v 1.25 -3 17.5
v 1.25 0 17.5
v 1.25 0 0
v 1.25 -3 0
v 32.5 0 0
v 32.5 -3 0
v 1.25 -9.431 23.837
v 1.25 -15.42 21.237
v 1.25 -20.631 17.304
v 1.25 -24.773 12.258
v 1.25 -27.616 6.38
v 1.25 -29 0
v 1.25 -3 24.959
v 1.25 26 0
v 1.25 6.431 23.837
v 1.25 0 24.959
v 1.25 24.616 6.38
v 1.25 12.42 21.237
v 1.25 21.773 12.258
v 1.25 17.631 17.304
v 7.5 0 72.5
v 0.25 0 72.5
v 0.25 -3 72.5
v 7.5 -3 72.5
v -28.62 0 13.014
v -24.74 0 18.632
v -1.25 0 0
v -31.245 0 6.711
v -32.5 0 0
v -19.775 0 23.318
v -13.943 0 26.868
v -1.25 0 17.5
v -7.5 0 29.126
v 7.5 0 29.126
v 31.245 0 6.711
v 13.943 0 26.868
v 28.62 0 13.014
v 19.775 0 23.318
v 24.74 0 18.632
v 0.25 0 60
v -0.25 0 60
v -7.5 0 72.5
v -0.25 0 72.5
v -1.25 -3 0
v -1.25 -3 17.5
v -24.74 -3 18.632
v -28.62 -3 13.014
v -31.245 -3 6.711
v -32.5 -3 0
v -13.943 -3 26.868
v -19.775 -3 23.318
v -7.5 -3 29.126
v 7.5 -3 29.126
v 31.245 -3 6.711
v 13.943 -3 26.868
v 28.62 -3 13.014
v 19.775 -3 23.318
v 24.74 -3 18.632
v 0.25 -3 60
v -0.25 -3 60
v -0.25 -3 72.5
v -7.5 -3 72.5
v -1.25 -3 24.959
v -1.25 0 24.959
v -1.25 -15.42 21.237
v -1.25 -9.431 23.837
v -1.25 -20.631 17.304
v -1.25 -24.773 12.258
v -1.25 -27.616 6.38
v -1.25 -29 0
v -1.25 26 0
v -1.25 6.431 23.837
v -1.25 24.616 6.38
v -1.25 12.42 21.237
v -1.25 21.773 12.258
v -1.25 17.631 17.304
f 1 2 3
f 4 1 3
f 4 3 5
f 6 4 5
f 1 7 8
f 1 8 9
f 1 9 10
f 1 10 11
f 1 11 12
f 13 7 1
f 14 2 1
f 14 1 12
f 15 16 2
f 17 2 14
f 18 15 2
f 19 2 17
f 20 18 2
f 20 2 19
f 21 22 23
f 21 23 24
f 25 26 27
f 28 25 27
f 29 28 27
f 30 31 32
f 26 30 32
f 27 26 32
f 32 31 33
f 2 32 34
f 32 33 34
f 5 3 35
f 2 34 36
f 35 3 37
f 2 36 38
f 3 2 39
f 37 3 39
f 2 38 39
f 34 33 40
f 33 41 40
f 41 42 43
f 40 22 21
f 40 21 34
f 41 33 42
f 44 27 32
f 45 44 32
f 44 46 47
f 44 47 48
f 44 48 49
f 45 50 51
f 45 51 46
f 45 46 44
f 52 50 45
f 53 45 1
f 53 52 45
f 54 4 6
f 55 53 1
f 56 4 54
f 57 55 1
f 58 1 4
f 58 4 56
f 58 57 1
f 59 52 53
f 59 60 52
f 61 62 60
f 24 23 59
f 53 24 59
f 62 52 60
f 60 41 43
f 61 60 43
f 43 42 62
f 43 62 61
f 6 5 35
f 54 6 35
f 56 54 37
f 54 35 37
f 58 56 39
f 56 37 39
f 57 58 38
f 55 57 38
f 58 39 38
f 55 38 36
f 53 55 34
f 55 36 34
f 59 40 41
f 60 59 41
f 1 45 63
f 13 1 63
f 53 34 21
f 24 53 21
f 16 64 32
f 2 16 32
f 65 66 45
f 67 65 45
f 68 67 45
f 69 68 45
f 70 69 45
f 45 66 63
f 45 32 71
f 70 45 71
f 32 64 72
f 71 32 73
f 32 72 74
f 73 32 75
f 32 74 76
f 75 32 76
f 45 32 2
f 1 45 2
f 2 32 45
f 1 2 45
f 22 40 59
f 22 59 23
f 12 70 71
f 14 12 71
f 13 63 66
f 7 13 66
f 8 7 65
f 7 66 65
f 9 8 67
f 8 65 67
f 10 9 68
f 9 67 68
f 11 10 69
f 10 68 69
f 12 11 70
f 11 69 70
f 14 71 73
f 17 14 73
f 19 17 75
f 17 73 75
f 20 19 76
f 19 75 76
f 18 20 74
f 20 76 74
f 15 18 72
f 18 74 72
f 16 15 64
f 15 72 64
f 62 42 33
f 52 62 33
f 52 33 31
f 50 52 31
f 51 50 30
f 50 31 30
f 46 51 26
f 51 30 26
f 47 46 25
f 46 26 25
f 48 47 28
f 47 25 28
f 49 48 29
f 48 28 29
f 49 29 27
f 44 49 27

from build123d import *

# Parameters (mm, degrees)
F0_W     = 7.25
F0_H     = 12.5
F1_DEPTH = 3
F3_DEPTH = 2.5


with BuildPart() as f1:
    # F0 (on Front) → F1 (new body)
    with BuildSketch(Plane.XZ):
        with BuildLine():
            ThreePointArc((-7.5, 29.125656592), (-24.7401691178, 18.6315512644), (-32.5, 0))
            Line((-32.5, 0), (-7.5, 0))
            Line((-7.5, 0), (-7.5, 29.125656592))
        make_face()
        with BuildLine():
            Line((-7.5, 29.125656592), (-7.5, 0))
            Line((-7.5, 0), (-1.25, 0))
            Line((-1.25, 0), (-1.25, 17.5))
            Line((-1.25, 17.5), (0, 17.5))
            Line((0, 17.5), (0, 30))
            ThreePointArc((0, 30), (-3.7753965485, 29.7806764691), (-7.5, 29.125656592))
        make_face()
        with BuildLine():
            Line((-7.5, 60), (-7.5, 29.125656592))
            ThreePointArc((-7.5, 29.125656592), (-3.7753965485, 29.7806764691), (0, 30))
            ThreePointArc((0, 30), (3.7753965485, 29.7806764691), (7.5, 29.125656592))
            Line((7.5, 29.125656592), (7.5, 60))
            Line((7.5, 60), (0.25, 60))
            Line((0.25, 60), (-0.25, 60))
            Line((-0.25, 60), (-7.5, 60))
        make_face()
        with BuildLine():
            ThreePointArc((7.5, 29.125656592), (3.7753965485, 29.7806764691), (0, 30))
            Line((0, 30), (0, 17.5))
            Line((0, 17.5), (1.25, 17.5))
            Line((1.25, 17.5), (1.25, 0))
            Line((1.25, 0), (7.5, 0))
            Line((7.5, 0), (7.5, 29.125656592))
        make_face()
        with Locations((-3.875, 66.25)):
            Rectangle(F0_W, F0_H)
        with BuildLine():
            ThreePointArc((32.5, 0), (24.7401691178, 18.6315512644), (7.5, 29.125656592))
            Line((7.5, 29.125656592), (7.5, 0))
            Line((7.5, 0), (32.5, 0))
        make_face()
        with Locations((3.875, 66.25)):
            Rectangle(F0_W, F0_H)
    extrude(amount=F1_DEPTH)


with BuildPart() as f3:
    # F2 (on face) → F3 (new body)
    with BuildSketch(Plane.YZ.offset(-1.25)):
        Polygon((-3, 17.5), (-3, 0), (-1.5, 0), (0, 0), (0, 17.5), align=None)
        with BuildLine():
            Line((-29, 0), (-3, 0))
            Line((-3, 0), (-3, 17.5))
            Line((-3, 17.5), (-3, 24.9592459567))
            ThreePointArc((-3, 24.9592459567), (-20.6308909798, 17.3036134821), (-29, 0))
        make_face()
        with BuildLine():
            Line((0, 24.9592459567), (0, 17.5))
            Line((0, 17.5), (0, 0))
            Line((0, 0), (26, 0))
            ThreePointArc((26, 0), (17.6308909798, 17.3036134821), (0, 24.9592459567))
        make_face()
    extrude(amount=F3_DEPTH)


solid = Compound([f1.part, f3.part])
